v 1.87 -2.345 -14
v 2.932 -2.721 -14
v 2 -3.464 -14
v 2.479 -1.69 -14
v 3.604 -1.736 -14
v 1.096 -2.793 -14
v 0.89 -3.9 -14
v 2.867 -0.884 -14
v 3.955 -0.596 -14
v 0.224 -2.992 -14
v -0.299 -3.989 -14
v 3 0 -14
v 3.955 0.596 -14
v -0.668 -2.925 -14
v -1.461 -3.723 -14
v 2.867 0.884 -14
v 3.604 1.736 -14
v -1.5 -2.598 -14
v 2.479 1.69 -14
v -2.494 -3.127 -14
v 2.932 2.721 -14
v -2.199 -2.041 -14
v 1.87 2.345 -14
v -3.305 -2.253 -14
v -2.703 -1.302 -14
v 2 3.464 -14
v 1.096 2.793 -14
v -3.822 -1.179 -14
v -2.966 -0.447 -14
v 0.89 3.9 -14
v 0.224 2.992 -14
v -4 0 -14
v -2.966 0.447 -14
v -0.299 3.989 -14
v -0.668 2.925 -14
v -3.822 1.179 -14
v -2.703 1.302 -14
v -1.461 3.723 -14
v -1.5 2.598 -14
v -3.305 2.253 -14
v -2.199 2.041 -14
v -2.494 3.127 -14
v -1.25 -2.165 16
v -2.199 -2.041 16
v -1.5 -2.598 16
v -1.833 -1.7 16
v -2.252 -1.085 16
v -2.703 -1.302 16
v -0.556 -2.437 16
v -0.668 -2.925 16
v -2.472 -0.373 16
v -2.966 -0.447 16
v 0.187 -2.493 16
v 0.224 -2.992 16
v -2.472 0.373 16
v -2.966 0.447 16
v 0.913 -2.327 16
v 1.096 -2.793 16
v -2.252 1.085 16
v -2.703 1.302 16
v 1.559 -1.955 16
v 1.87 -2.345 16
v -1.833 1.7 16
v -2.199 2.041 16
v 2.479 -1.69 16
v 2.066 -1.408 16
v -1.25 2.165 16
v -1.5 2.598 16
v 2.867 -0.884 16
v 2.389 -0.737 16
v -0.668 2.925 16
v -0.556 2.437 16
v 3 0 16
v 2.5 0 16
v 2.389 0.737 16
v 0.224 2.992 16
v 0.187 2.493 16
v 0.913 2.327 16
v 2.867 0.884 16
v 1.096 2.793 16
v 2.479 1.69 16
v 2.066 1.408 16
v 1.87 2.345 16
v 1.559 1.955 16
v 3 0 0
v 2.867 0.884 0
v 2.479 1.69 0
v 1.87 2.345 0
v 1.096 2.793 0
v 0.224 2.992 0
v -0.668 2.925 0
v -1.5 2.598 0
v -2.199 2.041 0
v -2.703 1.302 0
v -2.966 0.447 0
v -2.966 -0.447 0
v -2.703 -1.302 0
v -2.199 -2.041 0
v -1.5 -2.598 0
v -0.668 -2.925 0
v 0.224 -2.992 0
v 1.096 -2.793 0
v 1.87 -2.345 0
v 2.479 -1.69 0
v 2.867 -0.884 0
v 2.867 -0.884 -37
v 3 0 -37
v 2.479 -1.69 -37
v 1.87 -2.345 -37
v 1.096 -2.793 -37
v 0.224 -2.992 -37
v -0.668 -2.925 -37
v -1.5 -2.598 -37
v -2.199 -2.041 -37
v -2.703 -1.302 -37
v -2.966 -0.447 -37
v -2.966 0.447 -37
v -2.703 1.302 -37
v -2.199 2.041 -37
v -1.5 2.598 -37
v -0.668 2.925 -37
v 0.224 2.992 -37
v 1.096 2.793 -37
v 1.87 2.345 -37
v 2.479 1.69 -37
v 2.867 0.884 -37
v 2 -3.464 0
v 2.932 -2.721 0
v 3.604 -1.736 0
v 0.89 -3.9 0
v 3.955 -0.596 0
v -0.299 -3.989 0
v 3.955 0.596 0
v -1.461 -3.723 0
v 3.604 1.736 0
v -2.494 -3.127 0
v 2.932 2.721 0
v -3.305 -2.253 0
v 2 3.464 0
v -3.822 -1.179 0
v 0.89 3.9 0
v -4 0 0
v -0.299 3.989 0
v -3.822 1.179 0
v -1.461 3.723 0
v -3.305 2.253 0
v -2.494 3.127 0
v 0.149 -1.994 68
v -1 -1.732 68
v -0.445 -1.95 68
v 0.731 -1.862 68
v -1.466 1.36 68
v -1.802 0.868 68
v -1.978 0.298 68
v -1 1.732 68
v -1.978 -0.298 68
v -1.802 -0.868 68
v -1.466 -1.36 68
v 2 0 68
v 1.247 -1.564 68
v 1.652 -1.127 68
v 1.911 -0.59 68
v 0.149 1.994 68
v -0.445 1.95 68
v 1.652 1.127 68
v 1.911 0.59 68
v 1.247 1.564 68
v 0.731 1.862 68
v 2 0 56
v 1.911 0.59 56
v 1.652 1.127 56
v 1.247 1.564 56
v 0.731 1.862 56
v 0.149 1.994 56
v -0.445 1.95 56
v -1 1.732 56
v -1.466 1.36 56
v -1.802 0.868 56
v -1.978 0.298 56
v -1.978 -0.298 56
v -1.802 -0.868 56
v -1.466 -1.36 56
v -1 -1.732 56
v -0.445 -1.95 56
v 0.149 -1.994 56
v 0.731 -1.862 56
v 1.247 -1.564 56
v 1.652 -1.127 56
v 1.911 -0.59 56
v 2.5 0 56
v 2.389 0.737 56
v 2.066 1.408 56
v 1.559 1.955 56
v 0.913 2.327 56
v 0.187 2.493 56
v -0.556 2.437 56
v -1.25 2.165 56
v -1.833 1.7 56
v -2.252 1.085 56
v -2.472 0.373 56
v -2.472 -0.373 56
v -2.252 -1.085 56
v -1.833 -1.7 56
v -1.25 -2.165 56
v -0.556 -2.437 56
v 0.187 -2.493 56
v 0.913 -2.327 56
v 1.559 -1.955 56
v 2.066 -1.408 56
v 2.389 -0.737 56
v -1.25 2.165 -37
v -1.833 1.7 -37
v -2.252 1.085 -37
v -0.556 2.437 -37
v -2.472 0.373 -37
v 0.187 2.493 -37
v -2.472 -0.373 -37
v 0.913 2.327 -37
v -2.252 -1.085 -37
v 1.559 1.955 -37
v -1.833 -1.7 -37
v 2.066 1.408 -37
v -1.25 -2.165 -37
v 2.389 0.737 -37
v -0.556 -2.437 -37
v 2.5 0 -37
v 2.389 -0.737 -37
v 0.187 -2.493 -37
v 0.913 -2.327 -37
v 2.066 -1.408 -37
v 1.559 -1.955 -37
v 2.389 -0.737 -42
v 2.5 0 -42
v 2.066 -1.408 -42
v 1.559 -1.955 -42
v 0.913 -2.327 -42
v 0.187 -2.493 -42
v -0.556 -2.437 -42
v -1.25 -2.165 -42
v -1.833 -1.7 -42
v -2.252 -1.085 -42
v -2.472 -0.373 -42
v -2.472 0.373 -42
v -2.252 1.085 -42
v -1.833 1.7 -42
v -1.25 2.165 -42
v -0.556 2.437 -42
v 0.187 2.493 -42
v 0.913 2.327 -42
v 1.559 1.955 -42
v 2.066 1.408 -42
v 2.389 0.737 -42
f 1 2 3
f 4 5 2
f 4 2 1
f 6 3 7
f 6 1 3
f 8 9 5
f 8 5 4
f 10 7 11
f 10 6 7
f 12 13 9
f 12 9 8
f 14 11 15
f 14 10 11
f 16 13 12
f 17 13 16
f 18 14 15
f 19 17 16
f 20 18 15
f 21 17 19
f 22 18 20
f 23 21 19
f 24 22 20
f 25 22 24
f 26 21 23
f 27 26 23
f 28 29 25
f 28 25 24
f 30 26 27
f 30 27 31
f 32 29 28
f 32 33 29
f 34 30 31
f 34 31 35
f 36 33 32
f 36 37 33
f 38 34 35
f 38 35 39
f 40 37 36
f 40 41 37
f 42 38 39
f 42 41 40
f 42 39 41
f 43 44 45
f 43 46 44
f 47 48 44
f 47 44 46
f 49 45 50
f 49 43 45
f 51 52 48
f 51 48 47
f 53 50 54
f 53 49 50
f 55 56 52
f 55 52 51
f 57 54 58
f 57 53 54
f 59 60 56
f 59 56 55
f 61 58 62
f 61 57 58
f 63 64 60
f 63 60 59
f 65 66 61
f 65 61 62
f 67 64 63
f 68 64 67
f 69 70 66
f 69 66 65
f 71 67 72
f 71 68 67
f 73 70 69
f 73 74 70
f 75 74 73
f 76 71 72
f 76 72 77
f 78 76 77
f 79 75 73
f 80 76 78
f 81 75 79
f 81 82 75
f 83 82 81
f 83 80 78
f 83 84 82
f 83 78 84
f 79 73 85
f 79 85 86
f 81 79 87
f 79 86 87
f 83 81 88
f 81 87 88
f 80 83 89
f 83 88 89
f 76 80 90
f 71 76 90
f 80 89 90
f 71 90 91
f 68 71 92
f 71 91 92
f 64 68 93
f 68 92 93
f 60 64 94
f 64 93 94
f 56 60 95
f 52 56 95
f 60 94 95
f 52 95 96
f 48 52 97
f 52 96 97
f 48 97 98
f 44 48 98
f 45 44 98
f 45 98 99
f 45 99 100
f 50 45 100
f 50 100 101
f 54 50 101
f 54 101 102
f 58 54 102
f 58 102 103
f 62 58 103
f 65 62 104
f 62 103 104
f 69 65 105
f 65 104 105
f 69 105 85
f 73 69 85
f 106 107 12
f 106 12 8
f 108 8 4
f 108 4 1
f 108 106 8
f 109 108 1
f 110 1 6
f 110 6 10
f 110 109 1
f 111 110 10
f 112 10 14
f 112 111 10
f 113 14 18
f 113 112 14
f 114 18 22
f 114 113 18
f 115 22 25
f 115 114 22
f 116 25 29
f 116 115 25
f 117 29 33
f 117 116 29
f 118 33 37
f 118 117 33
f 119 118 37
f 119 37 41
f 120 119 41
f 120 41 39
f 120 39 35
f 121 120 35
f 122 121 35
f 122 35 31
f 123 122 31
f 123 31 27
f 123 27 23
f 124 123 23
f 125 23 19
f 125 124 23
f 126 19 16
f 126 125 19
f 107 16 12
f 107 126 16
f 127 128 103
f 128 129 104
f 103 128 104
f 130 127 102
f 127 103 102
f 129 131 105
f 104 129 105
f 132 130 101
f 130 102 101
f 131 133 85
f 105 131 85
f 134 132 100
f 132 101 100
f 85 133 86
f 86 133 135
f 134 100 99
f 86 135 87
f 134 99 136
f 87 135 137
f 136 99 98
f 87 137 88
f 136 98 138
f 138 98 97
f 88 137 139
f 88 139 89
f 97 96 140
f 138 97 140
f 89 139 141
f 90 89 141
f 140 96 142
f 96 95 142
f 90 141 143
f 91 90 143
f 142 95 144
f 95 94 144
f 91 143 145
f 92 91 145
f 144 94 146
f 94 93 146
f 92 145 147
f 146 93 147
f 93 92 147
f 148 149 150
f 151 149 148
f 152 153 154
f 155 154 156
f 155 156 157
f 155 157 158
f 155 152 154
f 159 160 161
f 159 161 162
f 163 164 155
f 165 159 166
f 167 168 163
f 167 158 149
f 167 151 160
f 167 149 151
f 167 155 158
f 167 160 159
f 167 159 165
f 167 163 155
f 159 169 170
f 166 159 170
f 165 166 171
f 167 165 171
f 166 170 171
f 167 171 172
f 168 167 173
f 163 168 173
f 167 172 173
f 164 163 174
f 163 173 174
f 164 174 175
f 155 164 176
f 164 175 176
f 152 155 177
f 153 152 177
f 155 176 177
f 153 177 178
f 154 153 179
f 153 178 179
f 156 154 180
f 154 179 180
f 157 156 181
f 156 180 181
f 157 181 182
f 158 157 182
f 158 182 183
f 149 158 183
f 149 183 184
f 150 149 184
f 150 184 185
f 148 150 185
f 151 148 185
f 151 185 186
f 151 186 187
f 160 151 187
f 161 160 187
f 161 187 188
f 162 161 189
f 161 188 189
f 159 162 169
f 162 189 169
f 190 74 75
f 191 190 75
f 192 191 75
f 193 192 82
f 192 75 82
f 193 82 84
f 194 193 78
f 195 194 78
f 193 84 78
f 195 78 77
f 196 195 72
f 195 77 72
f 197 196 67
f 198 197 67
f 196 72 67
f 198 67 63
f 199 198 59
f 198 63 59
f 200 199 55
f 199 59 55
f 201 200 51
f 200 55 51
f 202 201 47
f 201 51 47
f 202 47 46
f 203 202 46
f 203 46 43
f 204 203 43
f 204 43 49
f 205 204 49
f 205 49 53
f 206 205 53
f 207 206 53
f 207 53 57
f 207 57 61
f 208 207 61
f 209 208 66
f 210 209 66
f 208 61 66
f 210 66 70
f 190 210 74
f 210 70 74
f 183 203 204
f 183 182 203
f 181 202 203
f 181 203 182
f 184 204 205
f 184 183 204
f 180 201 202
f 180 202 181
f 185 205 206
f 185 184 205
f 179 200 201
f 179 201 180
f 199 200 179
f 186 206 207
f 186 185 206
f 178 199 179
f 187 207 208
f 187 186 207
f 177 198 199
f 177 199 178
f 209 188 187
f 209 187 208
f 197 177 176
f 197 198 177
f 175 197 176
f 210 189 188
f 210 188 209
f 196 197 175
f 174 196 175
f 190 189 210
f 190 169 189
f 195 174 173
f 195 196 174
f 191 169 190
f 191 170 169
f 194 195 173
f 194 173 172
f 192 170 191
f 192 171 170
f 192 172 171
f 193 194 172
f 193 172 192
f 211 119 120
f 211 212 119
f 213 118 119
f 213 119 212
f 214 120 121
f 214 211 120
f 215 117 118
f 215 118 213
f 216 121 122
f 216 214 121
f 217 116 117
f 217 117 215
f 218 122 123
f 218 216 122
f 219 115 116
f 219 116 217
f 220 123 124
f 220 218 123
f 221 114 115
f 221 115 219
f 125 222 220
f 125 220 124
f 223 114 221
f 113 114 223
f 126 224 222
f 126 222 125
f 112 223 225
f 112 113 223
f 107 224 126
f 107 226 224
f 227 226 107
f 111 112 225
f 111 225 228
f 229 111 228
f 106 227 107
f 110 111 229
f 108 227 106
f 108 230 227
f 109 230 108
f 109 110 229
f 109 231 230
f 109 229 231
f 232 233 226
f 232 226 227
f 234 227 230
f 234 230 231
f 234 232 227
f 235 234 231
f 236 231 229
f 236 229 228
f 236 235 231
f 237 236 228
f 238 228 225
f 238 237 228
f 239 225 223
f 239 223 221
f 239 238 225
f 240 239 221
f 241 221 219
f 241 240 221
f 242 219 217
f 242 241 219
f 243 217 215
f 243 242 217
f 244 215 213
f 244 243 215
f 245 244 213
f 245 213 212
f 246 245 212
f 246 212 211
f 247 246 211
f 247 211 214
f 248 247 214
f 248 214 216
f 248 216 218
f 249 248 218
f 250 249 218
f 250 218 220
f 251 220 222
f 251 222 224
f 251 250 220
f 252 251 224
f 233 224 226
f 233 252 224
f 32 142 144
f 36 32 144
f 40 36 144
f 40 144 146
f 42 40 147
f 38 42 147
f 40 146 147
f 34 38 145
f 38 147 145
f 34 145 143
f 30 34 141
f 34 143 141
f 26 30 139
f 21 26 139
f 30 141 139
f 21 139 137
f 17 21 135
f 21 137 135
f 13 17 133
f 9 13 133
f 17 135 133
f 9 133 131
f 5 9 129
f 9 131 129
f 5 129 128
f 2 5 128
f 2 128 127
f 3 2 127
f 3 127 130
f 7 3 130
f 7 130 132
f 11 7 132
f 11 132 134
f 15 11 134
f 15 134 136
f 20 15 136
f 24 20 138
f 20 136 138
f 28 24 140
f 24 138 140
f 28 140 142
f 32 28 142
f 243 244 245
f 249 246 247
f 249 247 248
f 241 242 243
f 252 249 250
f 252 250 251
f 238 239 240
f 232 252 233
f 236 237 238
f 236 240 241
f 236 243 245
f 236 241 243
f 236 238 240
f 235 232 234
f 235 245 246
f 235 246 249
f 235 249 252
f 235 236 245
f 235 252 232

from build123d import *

# Parameters (mm, degrees)
SKETCH_1_R      = 3
EXTRUDE_1_DEPTH = 16
SKETCH_2_R      = 4
EXTRUDE_2_DEPTH = 14
EXTRUDE_START   = 23
SKETCH_3_R      = 3
EXTRUDE_3_DEPTH = 23
SKETCH_4_R      = 2.5
EXTRUDE_4_DEPTH = 40
SKETCH_7_R      = 2
EXTRUDE_5_DEPTH = 12
EXTRUDE_START_2 = 5
SKETCH_5_R      = 2.5
EXTRUDE_6_DEPTH = 5


with BuildPart() as part:
    # 草图1 → 凸台-拉伸1 (new body)
    with BuildSketch(Plane.XY):
        Circle(SKETCH_1_R)
    extrude(amount=EXTRUDE_1_DEPTH)

    # 草图2 → 凸台-拉伸2 (add)
    with BuildSketch(Plane(origin=(0, 0, 0), x_dir=(-1, 0, 0), z_dir=(0, 0, -1))):
        Circle(SKETCH_2_R)
    extrude(amount=EXTRUDE_2_DEPTH)

    # 草图3 → 凸台-拉伸3 (add)
    with BuildSketch(Plane(origin=(0, 0, -14), x_dir=(-1, 0, 0), z_dir=(0, 0, -1)).offset(EXTRUDE_START)):
        with Locations(Location((0, 0, 0), (0, 0, 180))):
            Circle(SKETCH_3_R)
    extrude(amount=-EXTRUDE_3_DEPTH)

    # 草图4 → 凸台-拉伸4 (add)
    with BuildSketch(Plane.XY.offset(16)):
        Circle(SKETCH_4_R)
    extrude(amount=EXTRUDE_4_DEPTH)

    # 草图7 → 凸台-拉伸5 (add)
    with BuildSketch(Plane.XY.offset(56)):
        Circle(SKETCH_7_R)
    extrude(amount=EXTRUDE_5_DEPTH)

    # 草图5 → 凸台-拉伸6 (add)
    with BuildSketch(Plane(origin=(0, 0, -37), x_dir=(-1, 0, 0), z_dir=(0, 0, -1)).offset(EXTRUDE_START_2)):
        with Locations(Location((0, 0, 0), (0, 0, 180))):
            Circle(SKETCH_5_R)
    extrude(amount=-EXTRUDE_6_DEPTH)


solid = part.part
